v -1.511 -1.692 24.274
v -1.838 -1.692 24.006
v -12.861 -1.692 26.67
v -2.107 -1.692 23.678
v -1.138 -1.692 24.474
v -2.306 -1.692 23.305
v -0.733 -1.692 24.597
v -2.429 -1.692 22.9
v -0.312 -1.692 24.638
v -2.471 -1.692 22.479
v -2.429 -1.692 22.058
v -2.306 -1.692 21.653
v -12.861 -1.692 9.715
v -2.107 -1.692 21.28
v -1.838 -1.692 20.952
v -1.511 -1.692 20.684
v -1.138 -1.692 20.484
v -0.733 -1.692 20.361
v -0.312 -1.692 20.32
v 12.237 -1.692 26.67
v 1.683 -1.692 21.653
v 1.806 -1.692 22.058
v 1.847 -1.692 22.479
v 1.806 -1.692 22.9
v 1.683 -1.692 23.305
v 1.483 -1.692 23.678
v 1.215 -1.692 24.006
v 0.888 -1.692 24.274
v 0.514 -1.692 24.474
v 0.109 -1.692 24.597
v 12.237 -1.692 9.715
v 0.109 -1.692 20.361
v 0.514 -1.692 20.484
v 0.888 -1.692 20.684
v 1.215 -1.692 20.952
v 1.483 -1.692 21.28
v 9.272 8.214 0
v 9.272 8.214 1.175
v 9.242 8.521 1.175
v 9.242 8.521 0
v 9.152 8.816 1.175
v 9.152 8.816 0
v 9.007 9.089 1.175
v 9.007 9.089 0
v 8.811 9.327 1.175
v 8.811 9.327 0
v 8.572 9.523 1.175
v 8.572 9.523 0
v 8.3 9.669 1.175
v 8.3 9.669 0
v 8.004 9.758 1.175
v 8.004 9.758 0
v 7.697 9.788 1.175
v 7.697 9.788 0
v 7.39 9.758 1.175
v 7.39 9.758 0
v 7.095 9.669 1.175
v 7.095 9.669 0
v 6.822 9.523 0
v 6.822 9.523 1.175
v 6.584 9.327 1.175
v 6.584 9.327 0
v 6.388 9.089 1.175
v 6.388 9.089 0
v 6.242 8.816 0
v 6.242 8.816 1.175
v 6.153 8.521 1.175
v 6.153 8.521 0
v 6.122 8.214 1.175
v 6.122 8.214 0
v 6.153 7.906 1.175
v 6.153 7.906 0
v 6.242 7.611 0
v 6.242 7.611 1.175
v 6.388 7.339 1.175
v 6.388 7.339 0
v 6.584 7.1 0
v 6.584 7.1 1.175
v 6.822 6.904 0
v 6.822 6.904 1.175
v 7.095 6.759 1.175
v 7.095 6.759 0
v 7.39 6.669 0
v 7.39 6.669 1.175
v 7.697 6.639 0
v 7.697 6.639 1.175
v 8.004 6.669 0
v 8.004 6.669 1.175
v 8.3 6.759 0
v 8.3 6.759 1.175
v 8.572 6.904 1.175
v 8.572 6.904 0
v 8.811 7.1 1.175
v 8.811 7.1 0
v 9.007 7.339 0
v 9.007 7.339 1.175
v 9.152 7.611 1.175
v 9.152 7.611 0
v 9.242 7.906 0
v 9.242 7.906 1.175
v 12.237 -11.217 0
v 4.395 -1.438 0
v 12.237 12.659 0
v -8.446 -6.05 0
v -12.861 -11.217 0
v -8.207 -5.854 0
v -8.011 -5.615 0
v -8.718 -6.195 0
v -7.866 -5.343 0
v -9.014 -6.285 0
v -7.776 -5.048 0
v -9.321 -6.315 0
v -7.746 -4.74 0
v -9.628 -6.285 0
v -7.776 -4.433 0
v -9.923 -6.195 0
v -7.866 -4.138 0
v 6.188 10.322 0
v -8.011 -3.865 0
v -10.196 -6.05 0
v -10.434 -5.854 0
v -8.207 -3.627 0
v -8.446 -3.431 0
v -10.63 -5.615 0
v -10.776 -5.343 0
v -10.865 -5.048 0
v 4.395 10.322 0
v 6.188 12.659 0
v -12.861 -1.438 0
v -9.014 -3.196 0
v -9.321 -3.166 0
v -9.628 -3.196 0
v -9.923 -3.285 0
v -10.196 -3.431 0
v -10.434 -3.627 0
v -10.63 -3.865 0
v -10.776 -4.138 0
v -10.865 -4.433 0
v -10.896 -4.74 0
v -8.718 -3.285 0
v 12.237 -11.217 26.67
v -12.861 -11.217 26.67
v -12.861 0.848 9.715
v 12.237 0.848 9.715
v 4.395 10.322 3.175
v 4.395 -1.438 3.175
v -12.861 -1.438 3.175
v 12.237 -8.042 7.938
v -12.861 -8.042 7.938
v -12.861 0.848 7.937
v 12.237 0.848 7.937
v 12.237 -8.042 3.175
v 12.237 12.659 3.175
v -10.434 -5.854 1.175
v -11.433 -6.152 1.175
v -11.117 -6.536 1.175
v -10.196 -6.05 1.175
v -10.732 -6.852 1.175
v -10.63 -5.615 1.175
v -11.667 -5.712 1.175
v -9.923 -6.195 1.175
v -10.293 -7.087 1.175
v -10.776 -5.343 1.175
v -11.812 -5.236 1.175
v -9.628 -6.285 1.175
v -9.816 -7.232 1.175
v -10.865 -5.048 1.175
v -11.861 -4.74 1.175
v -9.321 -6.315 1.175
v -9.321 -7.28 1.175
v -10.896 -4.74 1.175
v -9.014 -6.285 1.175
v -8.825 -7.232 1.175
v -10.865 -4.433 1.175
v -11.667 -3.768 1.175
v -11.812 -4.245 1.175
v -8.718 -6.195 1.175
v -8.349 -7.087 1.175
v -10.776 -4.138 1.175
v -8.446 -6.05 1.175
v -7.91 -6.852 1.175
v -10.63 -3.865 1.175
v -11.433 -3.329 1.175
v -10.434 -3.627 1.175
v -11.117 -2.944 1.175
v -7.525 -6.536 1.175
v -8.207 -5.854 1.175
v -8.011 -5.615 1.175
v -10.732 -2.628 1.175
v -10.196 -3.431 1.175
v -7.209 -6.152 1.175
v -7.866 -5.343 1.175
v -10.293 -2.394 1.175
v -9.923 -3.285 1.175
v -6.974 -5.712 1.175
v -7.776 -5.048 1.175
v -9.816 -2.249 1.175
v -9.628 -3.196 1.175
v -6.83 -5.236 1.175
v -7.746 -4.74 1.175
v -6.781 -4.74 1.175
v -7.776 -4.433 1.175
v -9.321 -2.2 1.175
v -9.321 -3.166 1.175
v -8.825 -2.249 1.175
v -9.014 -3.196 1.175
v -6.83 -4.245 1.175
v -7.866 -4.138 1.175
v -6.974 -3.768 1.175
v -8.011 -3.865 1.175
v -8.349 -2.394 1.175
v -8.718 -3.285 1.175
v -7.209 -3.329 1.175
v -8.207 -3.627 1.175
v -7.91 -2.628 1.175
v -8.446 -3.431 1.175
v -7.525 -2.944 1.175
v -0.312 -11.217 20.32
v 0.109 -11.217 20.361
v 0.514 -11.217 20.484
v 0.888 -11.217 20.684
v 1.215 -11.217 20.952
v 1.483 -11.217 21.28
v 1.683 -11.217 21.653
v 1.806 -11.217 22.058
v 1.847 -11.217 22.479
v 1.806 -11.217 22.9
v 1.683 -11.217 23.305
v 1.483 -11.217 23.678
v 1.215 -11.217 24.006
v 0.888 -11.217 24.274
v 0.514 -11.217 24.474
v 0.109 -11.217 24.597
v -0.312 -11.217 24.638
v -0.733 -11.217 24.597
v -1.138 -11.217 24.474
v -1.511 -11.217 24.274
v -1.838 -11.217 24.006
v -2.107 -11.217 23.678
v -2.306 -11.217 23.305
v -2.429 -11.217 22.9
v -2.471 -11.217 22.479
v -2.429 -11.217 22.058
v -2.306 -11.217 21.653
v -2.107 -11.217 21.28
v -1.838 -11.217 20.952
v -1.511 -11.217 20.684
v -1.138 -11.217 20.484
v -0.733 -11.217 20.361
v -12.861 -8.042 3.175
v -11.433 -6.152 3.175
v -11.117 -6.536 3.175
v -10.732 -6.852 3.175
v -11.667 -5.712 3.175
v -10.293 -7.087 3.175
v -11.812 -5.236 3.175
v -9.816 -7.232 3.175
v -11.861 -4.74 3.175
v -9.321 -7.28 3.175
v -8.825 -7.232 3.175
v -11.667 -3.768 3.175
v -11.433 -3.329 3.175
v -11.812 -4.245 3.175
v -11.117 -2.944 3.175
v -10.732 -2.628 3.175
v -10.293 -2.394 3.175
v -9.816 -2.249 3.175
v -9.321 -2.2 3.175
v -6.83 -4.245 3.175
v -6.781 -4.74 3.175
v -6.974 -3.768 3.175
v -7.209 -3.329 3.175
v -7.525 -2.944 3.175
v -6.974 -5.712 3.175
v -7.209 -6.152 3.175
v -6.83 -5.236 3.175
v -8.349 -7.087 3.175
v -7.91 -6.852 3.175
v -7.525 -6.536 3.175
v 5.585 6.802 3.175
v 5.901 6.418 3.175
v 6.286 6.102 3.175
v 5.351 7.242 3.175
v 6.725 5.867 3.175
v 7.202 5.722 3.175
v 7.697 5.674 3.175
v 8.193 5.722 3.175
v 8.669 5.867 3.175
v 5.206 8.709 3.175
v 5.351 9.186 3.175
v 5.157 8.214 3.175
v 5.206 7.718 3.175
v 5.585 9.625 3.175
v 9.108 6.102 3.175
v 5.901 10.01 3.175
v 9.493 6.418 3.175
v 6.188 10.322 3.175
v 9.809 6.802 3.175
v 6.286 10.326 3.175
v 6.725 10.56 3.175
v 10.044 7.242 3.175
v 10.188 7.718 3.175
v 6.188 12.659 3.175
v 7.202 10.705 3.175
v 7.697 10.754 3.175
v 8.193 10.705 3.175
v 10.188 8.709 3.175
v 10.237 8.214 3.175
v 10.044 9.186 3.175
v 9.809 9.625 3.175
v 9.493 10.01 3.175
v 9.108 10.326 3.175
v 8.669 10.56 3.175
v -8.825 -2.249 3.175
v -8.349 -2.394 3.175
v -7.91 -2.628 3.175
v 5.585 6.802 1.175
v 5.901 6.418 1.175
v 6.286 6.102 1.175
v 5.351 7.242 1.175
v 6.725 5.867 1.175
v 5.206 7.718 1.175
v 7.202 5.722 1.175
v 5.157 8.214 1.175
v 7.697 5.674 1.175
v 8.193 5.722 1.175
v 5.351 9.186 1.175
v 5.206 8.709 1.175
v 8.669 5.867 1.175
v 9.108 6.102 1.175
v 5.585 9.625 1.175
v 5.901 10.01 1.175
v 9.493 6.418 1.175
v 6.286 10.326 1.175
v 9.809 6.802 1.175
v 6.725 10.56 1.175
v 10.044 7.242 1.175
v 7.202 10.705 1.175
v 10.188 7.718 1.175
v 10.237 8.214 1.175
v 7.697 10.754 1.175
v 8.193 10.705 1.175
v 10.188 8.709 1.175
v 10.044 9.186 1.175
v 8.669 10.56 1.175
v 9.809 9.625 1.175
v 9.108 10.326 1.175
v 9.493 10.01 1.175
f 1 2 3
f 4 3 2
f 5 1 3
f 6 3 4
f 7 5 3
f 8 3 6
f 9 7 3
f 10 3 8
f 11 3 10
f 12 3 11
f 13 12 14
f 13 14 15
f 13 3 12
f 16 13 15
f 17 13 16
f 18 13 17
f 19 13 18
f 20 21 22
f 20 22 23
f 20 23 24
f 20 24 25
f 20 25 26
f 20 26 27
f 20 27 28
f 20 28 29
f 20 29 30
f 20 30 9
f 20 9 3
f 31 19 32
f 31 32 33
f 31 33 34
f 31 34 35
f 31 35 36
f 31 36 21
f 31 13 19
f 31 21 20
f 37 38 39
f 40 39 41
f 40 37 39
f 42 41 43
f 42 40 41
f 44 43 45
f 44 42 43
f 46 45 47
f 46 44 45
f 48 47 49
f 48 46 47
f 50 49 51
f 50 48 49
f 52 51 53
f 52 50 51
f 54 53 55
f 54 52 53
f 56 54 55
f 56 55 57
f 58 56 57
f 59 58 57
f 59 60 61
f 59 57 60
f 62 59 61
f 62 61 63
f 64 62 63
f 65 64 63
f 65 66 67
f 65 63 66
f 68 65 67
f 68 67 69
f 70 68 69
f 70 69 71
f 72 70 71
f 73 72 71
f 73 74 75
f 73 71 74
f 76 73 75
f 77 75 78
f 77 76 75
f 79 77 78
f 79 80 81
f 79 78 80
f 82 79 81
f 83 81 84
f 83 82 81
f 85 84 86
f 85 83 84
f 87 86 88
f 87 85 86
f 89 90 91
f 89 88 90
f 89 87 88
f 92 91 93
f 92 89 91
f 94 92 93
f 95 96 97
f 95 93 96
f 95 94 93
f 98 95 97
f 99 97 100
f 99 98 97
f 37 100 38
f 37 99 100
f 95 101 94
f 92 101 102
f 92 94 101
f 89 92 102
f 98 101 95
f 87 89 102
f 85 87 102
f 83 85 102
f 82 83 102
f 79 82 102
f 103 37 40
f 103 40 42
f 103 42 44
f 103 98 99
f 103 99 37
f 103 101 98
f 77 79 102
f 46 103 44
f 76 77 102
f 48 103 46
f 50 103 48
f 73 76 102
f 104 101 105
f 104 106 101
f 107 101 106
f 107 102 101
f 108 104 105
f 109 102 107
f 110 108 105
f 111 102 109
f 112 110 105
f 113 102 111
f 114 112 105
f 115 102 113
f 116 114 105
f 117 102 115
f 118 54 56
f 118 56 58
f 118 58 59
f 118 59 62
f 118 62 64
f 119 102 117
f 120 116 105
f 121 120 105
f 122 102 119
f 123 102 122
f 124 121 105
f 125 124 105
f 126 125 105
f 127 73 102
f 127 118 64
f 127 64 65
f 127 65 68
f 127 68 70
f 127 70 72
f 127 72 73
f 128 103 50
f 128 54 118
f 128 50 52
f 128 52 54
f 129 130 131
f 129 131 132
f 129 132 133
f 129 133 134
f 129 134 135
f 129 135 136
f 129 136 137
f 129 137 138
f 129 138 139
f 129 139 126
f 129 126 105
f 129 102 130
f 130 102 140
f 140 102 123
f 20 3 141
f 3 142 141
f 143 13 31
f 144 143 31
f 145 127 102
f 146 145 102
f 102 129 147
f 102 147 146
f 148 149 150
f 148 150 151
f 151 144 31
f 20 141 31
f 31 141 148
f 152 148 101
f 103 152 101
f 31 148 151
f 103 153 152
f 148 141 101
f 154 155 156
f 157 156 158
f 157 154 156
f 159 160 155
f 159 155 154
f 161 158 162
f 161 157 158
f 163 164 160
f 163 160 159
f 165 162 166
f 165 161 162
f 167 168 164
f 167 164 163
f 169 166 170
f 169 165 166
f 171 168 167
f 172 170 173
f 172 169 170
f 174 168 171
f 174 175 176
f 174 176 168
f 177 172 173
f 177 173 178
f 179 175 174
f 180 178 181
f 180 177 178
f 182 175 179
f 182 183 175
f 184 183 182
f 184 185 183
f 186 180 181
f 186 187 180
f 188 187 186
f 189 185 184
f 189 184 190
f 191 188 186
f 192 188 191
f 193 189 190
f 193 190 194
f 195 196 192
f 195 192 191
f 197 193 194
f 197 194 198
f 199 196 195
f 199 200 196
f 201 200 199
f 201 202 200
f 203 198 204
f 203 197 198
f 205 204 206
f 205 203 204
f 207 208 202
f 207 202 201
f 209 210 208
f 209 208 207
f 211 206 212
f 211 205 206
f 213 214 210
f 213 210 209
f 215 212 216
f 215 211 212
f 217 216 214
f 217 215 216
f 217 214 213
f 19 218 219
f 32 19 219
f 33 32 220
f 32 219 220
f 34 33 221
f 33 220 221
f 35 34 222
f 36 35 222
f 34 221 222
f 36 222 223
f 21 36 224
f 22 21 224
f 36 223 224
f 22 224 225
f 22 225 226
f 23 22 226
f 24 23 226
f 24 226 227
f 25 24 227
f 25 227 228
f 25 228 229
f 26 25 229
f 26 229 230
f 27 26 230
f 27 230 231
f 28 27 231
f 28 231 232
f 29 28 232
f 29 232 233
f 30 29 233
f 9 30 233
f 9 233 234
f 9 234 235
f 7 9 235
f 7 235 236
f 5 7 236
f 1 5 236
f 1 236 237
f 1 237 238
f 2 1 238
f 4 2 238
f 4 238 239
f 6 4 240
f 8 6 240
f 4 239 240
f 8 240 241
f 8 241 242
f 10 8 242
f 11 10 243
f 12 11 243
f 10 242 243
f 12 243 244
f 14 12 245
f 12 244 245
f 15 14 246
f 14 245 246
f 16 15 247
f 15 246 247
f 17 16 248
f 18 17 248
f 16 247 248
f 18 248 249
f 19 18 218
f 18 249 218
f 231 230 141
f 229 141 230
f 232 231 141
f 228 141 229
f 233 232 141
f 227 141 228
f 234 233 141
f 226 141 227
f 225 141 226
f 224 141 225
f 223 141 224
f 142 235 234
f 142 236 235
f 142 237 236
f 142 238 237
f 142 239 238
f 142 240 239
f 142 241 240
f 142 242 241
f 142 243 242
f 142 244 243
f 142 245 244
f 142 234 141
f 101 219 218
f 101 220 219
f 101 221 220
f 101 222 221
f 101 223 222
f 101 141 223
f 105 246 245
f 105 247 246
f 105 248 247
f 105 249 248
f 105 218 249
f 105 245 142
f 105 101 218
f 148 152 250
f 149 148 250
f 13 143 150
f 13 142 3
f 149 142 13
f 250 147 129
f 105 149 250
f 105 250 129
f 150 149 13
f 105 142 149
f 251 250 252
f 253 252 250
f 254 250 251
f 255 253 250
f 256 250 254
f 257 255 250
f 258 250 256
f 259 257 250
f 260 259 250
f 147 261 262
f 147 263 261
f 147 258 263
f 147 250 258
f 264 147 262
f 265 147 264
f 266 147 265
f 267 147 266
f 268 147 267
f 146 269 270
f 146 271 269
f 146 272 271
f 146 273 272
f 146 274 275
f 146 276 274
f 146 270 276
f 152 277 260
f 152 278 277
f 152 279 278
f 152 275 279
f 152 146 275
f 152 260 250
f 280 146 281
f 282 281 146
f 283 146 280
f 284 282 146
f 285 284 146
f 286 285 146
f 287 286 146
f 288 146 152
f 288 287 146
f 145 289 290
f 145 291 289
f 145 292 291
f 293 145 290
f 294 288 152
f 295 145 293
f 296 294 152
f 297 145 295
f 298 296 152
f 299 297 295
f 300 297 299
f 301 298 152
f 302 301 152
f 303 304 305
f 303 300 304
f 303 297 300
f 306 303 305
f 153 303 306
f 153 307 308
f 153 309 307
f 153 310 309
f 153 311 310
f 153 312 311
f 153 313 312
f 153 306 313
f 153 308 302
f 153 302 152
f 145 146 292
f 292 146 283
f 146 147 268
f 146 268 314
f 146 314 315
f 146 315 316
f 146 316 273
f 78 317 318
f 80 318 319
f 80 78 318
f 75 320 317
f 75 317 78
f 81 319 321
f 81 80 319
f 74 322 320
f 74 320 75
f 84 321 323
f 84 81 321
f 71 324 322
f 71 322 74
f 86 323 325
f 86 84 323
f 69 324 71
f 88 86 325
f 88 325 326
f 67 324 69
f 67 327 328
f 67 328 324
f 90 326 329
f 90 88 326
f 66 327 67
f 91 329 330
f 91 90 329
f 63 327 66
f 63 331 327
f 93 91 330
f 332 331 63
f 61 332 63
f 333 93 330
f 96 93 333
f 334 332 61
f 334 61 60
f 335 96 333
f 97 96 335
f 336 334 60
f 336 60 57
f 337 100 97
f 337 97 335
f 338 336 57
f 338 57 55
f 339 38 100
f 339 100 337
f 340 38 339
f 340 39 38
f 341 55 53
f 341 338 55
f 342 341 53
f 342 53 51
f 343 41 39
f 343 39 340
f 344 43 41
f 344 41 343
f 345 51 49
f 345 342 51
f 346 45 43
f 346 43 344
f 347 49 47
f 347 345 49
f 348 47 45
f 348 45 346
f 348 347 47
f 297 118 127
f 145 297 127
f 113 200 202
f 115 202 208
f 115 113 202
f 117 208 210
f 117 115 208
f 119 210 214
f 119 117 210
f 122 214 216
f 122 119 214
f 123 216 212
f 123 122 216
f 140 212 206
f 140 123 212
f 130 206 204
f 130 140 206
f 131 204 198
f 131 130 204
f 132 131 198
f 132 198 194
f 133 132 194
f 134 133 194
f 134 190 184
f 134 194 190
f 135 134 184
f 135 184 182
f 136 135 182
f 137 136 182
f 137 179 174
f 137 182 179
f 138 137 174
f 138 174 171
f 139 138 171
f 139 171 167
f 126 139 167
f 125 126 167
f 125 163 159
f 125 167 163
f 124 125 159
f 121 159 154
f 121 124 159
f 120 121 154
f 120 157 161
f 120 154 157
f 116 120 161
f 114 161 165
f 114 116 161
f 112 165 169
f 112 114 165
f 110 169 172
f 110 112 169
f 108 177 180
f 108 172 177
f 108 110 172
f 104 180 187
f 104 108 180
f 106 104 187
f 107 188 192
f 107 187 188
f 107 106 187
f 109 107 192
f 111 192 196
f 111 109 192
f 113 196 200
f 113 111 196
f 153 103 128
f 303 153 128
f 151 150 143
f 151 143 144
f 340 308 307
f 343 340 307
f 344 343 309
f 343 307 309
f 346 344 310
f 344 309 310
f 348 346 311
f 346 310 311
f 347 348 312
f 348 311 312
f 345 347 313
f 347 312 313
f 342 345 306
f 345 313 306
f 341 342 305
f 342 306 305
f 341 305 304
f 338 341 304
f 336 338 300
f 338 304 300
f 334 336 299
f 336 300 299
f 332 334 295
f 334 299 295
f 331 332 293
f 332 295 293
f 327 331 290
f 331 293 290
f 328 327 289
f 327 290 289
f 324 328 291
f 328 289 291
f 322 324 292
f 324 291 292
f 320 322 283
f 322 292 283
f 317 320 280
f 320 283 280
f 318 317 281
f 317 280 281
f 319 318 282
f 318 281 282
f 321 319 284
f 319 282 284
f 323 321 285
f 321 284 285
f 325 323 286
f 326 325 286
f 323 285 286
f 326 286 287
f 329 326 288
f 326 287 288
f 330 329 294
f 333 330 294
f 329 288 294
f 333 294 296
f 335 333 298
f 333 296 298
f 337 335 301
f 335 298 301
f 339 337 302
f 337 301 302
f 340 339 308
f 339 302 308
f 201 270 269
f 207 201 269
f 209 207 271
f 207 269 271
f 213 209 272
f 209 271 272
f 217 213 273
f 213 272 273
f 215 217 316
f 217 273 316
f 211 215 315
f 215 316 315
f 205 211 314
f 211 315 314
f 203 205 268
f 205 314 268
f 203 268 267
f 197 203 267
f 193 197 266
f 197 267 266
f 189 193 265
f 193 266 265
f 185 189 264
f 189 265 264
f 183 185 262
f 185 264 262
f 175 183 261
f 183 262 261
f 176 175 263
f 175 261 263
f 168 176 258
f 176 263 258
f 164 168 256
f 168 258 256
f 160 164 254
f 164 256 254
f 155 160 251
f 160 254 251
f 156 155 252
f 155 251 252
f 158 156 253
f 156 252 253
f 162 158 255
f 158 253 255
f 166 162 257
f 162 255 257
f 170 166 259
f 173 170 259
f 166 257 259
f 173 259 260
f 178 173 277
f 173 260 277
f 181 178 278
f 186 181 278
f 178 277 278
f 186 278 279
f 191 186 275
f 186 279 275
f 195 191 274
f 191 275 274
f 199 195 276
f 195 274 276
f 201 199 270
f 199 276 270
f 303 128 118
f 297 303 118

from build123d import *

# Parameters (mm, degrees)
SKETCH2_R           = 1.5748
SKETCH2_W           = 1
SKETCH2_H           = 6.604
BOSS_EXTRUDE1_DEPTH = 3.175
SKETCH3_W           = 25.098
SKETCH3_H           = 3.175
BOSS_EXTRUDE3_DEPTH = 26.67
SKETCH5_R           = 2.54
CUT_EXTRUDE2_DEPTH  = 2
SKETCH6_W           = 25.098
SKETCH6_H           = 18.7325
BOSS_EXTRUDE4_DEPTH = 6.35
SKETCH4_R           = 2.159
CUT_EXTRUDE3_DEPTH  = 39.036194564
SKETCH7_W           = 25.098
SKETCH7_H           = 1.778
BOSS_EXTRUDE5_DEPTH = 2.54


with BuildPart() as part:
    # Sketch2 → Boss-Extrude1 (new body)
    # profile 1 of 2: a face of its own
    with BuildSketch(Plane.XY):
        Polygon((4.395213829, 10.321811953), (4.395213829, 7.827388121), (4.395213829, -1.438404904), (-11.860786171, -1.438404904), (-11.860786171, -8.042404904), (12.237213829, -8.042404904), (12.237213829, 12.658595096), (7.697213829, 12.658595096), (6.188170382, 12.658595096), (6.188170382, 10.321811953), align=None)
        with Locations((-9.320786171, -4.740404904)):
            Circle(SKETCH2_R, mode=Mode.SUBTRACT)
        with Locations((7.697213829, 8.213595096)):
            Circle(SKETCH2_R, mode=Mode.SUBTRACT)
    # profile 2 of 2: a face of its own
    with BuildSketch(Plane.XY):
        with Locations((-12.360786171, -4.740404904)):
            Rectangle(SKETCH2_W, SKETCH2_H)
    extrude(amount=BOSS_EXTRUDE1_DEPTH)

    # Sketch3 → Boss-Extrude3 (add)
    with BuildSketch(Plane(origin=(0, 0, 0), x_dir=(-1, 0, 0), z_dir=(0, 0, -1))):
        with Locations((0.311786171, -9.629904904)):
            Rectangle(SKETCH3_W, SKETCH3_H)
    extrude(amount=-BOSS_EXTRUDE3_DEPTH)

    # Sketch5 → Cut-Extrude2 (cut)
    with BuildSketch(Plane.XY.offset(3.175)):
        with Locations((7.697213829, 8.213595096)):
            Circle(SKETCH5_R)
        with Locations((-9.320786171, -4.740404904)):
            Circle(SKETCH5_R)
    extrude(amount=-CUT_EXTRUDE2_DEPTH, mode=Mode.SUBTRACT)

    # Sketch6 → Boss-Extrude4 (add)
    with BuildSketch(Plane(origin=(0, -8.042404904, 0), x_dir=(1, 0, 0), z_dir=(0, 1, 0))):
        with Locations((-0.311786171, -17.30375)):
            Rectangle(SKETCH6_W, SKETCH6_H)
    extrude(amount=BOSS_EXTRUDE4_DEPTH)

    # Sketch4 → Cut-Extrude3 (cut, through all)
    with BuildSketch(Plane.XZ.offset(11.217404904)):
        with Locations(Location((-0.311786171, 22.479, 0), (0, 0, 270))):
            Circle(SKETCH4_R)
    extrude(amount=-CUT_EXTRUDE3_DEPTH, mode=Mode.SUBTRACT)

    # Sketch7 → Boss-Extrude5 (add)
    with BuildSketch(Plane(origin=(0, -1.692404904, 0), x_dir=(1, 0, 0), z_dir=(0, 1, 0))):
        with Locations((-0.311786171, -8.8265)):
            Rectangle(SKETCH7_W, SKETCH7_H)
    extrude(amount=BOSS_EXTRUDE5_DEPTH)


solid = part.part
